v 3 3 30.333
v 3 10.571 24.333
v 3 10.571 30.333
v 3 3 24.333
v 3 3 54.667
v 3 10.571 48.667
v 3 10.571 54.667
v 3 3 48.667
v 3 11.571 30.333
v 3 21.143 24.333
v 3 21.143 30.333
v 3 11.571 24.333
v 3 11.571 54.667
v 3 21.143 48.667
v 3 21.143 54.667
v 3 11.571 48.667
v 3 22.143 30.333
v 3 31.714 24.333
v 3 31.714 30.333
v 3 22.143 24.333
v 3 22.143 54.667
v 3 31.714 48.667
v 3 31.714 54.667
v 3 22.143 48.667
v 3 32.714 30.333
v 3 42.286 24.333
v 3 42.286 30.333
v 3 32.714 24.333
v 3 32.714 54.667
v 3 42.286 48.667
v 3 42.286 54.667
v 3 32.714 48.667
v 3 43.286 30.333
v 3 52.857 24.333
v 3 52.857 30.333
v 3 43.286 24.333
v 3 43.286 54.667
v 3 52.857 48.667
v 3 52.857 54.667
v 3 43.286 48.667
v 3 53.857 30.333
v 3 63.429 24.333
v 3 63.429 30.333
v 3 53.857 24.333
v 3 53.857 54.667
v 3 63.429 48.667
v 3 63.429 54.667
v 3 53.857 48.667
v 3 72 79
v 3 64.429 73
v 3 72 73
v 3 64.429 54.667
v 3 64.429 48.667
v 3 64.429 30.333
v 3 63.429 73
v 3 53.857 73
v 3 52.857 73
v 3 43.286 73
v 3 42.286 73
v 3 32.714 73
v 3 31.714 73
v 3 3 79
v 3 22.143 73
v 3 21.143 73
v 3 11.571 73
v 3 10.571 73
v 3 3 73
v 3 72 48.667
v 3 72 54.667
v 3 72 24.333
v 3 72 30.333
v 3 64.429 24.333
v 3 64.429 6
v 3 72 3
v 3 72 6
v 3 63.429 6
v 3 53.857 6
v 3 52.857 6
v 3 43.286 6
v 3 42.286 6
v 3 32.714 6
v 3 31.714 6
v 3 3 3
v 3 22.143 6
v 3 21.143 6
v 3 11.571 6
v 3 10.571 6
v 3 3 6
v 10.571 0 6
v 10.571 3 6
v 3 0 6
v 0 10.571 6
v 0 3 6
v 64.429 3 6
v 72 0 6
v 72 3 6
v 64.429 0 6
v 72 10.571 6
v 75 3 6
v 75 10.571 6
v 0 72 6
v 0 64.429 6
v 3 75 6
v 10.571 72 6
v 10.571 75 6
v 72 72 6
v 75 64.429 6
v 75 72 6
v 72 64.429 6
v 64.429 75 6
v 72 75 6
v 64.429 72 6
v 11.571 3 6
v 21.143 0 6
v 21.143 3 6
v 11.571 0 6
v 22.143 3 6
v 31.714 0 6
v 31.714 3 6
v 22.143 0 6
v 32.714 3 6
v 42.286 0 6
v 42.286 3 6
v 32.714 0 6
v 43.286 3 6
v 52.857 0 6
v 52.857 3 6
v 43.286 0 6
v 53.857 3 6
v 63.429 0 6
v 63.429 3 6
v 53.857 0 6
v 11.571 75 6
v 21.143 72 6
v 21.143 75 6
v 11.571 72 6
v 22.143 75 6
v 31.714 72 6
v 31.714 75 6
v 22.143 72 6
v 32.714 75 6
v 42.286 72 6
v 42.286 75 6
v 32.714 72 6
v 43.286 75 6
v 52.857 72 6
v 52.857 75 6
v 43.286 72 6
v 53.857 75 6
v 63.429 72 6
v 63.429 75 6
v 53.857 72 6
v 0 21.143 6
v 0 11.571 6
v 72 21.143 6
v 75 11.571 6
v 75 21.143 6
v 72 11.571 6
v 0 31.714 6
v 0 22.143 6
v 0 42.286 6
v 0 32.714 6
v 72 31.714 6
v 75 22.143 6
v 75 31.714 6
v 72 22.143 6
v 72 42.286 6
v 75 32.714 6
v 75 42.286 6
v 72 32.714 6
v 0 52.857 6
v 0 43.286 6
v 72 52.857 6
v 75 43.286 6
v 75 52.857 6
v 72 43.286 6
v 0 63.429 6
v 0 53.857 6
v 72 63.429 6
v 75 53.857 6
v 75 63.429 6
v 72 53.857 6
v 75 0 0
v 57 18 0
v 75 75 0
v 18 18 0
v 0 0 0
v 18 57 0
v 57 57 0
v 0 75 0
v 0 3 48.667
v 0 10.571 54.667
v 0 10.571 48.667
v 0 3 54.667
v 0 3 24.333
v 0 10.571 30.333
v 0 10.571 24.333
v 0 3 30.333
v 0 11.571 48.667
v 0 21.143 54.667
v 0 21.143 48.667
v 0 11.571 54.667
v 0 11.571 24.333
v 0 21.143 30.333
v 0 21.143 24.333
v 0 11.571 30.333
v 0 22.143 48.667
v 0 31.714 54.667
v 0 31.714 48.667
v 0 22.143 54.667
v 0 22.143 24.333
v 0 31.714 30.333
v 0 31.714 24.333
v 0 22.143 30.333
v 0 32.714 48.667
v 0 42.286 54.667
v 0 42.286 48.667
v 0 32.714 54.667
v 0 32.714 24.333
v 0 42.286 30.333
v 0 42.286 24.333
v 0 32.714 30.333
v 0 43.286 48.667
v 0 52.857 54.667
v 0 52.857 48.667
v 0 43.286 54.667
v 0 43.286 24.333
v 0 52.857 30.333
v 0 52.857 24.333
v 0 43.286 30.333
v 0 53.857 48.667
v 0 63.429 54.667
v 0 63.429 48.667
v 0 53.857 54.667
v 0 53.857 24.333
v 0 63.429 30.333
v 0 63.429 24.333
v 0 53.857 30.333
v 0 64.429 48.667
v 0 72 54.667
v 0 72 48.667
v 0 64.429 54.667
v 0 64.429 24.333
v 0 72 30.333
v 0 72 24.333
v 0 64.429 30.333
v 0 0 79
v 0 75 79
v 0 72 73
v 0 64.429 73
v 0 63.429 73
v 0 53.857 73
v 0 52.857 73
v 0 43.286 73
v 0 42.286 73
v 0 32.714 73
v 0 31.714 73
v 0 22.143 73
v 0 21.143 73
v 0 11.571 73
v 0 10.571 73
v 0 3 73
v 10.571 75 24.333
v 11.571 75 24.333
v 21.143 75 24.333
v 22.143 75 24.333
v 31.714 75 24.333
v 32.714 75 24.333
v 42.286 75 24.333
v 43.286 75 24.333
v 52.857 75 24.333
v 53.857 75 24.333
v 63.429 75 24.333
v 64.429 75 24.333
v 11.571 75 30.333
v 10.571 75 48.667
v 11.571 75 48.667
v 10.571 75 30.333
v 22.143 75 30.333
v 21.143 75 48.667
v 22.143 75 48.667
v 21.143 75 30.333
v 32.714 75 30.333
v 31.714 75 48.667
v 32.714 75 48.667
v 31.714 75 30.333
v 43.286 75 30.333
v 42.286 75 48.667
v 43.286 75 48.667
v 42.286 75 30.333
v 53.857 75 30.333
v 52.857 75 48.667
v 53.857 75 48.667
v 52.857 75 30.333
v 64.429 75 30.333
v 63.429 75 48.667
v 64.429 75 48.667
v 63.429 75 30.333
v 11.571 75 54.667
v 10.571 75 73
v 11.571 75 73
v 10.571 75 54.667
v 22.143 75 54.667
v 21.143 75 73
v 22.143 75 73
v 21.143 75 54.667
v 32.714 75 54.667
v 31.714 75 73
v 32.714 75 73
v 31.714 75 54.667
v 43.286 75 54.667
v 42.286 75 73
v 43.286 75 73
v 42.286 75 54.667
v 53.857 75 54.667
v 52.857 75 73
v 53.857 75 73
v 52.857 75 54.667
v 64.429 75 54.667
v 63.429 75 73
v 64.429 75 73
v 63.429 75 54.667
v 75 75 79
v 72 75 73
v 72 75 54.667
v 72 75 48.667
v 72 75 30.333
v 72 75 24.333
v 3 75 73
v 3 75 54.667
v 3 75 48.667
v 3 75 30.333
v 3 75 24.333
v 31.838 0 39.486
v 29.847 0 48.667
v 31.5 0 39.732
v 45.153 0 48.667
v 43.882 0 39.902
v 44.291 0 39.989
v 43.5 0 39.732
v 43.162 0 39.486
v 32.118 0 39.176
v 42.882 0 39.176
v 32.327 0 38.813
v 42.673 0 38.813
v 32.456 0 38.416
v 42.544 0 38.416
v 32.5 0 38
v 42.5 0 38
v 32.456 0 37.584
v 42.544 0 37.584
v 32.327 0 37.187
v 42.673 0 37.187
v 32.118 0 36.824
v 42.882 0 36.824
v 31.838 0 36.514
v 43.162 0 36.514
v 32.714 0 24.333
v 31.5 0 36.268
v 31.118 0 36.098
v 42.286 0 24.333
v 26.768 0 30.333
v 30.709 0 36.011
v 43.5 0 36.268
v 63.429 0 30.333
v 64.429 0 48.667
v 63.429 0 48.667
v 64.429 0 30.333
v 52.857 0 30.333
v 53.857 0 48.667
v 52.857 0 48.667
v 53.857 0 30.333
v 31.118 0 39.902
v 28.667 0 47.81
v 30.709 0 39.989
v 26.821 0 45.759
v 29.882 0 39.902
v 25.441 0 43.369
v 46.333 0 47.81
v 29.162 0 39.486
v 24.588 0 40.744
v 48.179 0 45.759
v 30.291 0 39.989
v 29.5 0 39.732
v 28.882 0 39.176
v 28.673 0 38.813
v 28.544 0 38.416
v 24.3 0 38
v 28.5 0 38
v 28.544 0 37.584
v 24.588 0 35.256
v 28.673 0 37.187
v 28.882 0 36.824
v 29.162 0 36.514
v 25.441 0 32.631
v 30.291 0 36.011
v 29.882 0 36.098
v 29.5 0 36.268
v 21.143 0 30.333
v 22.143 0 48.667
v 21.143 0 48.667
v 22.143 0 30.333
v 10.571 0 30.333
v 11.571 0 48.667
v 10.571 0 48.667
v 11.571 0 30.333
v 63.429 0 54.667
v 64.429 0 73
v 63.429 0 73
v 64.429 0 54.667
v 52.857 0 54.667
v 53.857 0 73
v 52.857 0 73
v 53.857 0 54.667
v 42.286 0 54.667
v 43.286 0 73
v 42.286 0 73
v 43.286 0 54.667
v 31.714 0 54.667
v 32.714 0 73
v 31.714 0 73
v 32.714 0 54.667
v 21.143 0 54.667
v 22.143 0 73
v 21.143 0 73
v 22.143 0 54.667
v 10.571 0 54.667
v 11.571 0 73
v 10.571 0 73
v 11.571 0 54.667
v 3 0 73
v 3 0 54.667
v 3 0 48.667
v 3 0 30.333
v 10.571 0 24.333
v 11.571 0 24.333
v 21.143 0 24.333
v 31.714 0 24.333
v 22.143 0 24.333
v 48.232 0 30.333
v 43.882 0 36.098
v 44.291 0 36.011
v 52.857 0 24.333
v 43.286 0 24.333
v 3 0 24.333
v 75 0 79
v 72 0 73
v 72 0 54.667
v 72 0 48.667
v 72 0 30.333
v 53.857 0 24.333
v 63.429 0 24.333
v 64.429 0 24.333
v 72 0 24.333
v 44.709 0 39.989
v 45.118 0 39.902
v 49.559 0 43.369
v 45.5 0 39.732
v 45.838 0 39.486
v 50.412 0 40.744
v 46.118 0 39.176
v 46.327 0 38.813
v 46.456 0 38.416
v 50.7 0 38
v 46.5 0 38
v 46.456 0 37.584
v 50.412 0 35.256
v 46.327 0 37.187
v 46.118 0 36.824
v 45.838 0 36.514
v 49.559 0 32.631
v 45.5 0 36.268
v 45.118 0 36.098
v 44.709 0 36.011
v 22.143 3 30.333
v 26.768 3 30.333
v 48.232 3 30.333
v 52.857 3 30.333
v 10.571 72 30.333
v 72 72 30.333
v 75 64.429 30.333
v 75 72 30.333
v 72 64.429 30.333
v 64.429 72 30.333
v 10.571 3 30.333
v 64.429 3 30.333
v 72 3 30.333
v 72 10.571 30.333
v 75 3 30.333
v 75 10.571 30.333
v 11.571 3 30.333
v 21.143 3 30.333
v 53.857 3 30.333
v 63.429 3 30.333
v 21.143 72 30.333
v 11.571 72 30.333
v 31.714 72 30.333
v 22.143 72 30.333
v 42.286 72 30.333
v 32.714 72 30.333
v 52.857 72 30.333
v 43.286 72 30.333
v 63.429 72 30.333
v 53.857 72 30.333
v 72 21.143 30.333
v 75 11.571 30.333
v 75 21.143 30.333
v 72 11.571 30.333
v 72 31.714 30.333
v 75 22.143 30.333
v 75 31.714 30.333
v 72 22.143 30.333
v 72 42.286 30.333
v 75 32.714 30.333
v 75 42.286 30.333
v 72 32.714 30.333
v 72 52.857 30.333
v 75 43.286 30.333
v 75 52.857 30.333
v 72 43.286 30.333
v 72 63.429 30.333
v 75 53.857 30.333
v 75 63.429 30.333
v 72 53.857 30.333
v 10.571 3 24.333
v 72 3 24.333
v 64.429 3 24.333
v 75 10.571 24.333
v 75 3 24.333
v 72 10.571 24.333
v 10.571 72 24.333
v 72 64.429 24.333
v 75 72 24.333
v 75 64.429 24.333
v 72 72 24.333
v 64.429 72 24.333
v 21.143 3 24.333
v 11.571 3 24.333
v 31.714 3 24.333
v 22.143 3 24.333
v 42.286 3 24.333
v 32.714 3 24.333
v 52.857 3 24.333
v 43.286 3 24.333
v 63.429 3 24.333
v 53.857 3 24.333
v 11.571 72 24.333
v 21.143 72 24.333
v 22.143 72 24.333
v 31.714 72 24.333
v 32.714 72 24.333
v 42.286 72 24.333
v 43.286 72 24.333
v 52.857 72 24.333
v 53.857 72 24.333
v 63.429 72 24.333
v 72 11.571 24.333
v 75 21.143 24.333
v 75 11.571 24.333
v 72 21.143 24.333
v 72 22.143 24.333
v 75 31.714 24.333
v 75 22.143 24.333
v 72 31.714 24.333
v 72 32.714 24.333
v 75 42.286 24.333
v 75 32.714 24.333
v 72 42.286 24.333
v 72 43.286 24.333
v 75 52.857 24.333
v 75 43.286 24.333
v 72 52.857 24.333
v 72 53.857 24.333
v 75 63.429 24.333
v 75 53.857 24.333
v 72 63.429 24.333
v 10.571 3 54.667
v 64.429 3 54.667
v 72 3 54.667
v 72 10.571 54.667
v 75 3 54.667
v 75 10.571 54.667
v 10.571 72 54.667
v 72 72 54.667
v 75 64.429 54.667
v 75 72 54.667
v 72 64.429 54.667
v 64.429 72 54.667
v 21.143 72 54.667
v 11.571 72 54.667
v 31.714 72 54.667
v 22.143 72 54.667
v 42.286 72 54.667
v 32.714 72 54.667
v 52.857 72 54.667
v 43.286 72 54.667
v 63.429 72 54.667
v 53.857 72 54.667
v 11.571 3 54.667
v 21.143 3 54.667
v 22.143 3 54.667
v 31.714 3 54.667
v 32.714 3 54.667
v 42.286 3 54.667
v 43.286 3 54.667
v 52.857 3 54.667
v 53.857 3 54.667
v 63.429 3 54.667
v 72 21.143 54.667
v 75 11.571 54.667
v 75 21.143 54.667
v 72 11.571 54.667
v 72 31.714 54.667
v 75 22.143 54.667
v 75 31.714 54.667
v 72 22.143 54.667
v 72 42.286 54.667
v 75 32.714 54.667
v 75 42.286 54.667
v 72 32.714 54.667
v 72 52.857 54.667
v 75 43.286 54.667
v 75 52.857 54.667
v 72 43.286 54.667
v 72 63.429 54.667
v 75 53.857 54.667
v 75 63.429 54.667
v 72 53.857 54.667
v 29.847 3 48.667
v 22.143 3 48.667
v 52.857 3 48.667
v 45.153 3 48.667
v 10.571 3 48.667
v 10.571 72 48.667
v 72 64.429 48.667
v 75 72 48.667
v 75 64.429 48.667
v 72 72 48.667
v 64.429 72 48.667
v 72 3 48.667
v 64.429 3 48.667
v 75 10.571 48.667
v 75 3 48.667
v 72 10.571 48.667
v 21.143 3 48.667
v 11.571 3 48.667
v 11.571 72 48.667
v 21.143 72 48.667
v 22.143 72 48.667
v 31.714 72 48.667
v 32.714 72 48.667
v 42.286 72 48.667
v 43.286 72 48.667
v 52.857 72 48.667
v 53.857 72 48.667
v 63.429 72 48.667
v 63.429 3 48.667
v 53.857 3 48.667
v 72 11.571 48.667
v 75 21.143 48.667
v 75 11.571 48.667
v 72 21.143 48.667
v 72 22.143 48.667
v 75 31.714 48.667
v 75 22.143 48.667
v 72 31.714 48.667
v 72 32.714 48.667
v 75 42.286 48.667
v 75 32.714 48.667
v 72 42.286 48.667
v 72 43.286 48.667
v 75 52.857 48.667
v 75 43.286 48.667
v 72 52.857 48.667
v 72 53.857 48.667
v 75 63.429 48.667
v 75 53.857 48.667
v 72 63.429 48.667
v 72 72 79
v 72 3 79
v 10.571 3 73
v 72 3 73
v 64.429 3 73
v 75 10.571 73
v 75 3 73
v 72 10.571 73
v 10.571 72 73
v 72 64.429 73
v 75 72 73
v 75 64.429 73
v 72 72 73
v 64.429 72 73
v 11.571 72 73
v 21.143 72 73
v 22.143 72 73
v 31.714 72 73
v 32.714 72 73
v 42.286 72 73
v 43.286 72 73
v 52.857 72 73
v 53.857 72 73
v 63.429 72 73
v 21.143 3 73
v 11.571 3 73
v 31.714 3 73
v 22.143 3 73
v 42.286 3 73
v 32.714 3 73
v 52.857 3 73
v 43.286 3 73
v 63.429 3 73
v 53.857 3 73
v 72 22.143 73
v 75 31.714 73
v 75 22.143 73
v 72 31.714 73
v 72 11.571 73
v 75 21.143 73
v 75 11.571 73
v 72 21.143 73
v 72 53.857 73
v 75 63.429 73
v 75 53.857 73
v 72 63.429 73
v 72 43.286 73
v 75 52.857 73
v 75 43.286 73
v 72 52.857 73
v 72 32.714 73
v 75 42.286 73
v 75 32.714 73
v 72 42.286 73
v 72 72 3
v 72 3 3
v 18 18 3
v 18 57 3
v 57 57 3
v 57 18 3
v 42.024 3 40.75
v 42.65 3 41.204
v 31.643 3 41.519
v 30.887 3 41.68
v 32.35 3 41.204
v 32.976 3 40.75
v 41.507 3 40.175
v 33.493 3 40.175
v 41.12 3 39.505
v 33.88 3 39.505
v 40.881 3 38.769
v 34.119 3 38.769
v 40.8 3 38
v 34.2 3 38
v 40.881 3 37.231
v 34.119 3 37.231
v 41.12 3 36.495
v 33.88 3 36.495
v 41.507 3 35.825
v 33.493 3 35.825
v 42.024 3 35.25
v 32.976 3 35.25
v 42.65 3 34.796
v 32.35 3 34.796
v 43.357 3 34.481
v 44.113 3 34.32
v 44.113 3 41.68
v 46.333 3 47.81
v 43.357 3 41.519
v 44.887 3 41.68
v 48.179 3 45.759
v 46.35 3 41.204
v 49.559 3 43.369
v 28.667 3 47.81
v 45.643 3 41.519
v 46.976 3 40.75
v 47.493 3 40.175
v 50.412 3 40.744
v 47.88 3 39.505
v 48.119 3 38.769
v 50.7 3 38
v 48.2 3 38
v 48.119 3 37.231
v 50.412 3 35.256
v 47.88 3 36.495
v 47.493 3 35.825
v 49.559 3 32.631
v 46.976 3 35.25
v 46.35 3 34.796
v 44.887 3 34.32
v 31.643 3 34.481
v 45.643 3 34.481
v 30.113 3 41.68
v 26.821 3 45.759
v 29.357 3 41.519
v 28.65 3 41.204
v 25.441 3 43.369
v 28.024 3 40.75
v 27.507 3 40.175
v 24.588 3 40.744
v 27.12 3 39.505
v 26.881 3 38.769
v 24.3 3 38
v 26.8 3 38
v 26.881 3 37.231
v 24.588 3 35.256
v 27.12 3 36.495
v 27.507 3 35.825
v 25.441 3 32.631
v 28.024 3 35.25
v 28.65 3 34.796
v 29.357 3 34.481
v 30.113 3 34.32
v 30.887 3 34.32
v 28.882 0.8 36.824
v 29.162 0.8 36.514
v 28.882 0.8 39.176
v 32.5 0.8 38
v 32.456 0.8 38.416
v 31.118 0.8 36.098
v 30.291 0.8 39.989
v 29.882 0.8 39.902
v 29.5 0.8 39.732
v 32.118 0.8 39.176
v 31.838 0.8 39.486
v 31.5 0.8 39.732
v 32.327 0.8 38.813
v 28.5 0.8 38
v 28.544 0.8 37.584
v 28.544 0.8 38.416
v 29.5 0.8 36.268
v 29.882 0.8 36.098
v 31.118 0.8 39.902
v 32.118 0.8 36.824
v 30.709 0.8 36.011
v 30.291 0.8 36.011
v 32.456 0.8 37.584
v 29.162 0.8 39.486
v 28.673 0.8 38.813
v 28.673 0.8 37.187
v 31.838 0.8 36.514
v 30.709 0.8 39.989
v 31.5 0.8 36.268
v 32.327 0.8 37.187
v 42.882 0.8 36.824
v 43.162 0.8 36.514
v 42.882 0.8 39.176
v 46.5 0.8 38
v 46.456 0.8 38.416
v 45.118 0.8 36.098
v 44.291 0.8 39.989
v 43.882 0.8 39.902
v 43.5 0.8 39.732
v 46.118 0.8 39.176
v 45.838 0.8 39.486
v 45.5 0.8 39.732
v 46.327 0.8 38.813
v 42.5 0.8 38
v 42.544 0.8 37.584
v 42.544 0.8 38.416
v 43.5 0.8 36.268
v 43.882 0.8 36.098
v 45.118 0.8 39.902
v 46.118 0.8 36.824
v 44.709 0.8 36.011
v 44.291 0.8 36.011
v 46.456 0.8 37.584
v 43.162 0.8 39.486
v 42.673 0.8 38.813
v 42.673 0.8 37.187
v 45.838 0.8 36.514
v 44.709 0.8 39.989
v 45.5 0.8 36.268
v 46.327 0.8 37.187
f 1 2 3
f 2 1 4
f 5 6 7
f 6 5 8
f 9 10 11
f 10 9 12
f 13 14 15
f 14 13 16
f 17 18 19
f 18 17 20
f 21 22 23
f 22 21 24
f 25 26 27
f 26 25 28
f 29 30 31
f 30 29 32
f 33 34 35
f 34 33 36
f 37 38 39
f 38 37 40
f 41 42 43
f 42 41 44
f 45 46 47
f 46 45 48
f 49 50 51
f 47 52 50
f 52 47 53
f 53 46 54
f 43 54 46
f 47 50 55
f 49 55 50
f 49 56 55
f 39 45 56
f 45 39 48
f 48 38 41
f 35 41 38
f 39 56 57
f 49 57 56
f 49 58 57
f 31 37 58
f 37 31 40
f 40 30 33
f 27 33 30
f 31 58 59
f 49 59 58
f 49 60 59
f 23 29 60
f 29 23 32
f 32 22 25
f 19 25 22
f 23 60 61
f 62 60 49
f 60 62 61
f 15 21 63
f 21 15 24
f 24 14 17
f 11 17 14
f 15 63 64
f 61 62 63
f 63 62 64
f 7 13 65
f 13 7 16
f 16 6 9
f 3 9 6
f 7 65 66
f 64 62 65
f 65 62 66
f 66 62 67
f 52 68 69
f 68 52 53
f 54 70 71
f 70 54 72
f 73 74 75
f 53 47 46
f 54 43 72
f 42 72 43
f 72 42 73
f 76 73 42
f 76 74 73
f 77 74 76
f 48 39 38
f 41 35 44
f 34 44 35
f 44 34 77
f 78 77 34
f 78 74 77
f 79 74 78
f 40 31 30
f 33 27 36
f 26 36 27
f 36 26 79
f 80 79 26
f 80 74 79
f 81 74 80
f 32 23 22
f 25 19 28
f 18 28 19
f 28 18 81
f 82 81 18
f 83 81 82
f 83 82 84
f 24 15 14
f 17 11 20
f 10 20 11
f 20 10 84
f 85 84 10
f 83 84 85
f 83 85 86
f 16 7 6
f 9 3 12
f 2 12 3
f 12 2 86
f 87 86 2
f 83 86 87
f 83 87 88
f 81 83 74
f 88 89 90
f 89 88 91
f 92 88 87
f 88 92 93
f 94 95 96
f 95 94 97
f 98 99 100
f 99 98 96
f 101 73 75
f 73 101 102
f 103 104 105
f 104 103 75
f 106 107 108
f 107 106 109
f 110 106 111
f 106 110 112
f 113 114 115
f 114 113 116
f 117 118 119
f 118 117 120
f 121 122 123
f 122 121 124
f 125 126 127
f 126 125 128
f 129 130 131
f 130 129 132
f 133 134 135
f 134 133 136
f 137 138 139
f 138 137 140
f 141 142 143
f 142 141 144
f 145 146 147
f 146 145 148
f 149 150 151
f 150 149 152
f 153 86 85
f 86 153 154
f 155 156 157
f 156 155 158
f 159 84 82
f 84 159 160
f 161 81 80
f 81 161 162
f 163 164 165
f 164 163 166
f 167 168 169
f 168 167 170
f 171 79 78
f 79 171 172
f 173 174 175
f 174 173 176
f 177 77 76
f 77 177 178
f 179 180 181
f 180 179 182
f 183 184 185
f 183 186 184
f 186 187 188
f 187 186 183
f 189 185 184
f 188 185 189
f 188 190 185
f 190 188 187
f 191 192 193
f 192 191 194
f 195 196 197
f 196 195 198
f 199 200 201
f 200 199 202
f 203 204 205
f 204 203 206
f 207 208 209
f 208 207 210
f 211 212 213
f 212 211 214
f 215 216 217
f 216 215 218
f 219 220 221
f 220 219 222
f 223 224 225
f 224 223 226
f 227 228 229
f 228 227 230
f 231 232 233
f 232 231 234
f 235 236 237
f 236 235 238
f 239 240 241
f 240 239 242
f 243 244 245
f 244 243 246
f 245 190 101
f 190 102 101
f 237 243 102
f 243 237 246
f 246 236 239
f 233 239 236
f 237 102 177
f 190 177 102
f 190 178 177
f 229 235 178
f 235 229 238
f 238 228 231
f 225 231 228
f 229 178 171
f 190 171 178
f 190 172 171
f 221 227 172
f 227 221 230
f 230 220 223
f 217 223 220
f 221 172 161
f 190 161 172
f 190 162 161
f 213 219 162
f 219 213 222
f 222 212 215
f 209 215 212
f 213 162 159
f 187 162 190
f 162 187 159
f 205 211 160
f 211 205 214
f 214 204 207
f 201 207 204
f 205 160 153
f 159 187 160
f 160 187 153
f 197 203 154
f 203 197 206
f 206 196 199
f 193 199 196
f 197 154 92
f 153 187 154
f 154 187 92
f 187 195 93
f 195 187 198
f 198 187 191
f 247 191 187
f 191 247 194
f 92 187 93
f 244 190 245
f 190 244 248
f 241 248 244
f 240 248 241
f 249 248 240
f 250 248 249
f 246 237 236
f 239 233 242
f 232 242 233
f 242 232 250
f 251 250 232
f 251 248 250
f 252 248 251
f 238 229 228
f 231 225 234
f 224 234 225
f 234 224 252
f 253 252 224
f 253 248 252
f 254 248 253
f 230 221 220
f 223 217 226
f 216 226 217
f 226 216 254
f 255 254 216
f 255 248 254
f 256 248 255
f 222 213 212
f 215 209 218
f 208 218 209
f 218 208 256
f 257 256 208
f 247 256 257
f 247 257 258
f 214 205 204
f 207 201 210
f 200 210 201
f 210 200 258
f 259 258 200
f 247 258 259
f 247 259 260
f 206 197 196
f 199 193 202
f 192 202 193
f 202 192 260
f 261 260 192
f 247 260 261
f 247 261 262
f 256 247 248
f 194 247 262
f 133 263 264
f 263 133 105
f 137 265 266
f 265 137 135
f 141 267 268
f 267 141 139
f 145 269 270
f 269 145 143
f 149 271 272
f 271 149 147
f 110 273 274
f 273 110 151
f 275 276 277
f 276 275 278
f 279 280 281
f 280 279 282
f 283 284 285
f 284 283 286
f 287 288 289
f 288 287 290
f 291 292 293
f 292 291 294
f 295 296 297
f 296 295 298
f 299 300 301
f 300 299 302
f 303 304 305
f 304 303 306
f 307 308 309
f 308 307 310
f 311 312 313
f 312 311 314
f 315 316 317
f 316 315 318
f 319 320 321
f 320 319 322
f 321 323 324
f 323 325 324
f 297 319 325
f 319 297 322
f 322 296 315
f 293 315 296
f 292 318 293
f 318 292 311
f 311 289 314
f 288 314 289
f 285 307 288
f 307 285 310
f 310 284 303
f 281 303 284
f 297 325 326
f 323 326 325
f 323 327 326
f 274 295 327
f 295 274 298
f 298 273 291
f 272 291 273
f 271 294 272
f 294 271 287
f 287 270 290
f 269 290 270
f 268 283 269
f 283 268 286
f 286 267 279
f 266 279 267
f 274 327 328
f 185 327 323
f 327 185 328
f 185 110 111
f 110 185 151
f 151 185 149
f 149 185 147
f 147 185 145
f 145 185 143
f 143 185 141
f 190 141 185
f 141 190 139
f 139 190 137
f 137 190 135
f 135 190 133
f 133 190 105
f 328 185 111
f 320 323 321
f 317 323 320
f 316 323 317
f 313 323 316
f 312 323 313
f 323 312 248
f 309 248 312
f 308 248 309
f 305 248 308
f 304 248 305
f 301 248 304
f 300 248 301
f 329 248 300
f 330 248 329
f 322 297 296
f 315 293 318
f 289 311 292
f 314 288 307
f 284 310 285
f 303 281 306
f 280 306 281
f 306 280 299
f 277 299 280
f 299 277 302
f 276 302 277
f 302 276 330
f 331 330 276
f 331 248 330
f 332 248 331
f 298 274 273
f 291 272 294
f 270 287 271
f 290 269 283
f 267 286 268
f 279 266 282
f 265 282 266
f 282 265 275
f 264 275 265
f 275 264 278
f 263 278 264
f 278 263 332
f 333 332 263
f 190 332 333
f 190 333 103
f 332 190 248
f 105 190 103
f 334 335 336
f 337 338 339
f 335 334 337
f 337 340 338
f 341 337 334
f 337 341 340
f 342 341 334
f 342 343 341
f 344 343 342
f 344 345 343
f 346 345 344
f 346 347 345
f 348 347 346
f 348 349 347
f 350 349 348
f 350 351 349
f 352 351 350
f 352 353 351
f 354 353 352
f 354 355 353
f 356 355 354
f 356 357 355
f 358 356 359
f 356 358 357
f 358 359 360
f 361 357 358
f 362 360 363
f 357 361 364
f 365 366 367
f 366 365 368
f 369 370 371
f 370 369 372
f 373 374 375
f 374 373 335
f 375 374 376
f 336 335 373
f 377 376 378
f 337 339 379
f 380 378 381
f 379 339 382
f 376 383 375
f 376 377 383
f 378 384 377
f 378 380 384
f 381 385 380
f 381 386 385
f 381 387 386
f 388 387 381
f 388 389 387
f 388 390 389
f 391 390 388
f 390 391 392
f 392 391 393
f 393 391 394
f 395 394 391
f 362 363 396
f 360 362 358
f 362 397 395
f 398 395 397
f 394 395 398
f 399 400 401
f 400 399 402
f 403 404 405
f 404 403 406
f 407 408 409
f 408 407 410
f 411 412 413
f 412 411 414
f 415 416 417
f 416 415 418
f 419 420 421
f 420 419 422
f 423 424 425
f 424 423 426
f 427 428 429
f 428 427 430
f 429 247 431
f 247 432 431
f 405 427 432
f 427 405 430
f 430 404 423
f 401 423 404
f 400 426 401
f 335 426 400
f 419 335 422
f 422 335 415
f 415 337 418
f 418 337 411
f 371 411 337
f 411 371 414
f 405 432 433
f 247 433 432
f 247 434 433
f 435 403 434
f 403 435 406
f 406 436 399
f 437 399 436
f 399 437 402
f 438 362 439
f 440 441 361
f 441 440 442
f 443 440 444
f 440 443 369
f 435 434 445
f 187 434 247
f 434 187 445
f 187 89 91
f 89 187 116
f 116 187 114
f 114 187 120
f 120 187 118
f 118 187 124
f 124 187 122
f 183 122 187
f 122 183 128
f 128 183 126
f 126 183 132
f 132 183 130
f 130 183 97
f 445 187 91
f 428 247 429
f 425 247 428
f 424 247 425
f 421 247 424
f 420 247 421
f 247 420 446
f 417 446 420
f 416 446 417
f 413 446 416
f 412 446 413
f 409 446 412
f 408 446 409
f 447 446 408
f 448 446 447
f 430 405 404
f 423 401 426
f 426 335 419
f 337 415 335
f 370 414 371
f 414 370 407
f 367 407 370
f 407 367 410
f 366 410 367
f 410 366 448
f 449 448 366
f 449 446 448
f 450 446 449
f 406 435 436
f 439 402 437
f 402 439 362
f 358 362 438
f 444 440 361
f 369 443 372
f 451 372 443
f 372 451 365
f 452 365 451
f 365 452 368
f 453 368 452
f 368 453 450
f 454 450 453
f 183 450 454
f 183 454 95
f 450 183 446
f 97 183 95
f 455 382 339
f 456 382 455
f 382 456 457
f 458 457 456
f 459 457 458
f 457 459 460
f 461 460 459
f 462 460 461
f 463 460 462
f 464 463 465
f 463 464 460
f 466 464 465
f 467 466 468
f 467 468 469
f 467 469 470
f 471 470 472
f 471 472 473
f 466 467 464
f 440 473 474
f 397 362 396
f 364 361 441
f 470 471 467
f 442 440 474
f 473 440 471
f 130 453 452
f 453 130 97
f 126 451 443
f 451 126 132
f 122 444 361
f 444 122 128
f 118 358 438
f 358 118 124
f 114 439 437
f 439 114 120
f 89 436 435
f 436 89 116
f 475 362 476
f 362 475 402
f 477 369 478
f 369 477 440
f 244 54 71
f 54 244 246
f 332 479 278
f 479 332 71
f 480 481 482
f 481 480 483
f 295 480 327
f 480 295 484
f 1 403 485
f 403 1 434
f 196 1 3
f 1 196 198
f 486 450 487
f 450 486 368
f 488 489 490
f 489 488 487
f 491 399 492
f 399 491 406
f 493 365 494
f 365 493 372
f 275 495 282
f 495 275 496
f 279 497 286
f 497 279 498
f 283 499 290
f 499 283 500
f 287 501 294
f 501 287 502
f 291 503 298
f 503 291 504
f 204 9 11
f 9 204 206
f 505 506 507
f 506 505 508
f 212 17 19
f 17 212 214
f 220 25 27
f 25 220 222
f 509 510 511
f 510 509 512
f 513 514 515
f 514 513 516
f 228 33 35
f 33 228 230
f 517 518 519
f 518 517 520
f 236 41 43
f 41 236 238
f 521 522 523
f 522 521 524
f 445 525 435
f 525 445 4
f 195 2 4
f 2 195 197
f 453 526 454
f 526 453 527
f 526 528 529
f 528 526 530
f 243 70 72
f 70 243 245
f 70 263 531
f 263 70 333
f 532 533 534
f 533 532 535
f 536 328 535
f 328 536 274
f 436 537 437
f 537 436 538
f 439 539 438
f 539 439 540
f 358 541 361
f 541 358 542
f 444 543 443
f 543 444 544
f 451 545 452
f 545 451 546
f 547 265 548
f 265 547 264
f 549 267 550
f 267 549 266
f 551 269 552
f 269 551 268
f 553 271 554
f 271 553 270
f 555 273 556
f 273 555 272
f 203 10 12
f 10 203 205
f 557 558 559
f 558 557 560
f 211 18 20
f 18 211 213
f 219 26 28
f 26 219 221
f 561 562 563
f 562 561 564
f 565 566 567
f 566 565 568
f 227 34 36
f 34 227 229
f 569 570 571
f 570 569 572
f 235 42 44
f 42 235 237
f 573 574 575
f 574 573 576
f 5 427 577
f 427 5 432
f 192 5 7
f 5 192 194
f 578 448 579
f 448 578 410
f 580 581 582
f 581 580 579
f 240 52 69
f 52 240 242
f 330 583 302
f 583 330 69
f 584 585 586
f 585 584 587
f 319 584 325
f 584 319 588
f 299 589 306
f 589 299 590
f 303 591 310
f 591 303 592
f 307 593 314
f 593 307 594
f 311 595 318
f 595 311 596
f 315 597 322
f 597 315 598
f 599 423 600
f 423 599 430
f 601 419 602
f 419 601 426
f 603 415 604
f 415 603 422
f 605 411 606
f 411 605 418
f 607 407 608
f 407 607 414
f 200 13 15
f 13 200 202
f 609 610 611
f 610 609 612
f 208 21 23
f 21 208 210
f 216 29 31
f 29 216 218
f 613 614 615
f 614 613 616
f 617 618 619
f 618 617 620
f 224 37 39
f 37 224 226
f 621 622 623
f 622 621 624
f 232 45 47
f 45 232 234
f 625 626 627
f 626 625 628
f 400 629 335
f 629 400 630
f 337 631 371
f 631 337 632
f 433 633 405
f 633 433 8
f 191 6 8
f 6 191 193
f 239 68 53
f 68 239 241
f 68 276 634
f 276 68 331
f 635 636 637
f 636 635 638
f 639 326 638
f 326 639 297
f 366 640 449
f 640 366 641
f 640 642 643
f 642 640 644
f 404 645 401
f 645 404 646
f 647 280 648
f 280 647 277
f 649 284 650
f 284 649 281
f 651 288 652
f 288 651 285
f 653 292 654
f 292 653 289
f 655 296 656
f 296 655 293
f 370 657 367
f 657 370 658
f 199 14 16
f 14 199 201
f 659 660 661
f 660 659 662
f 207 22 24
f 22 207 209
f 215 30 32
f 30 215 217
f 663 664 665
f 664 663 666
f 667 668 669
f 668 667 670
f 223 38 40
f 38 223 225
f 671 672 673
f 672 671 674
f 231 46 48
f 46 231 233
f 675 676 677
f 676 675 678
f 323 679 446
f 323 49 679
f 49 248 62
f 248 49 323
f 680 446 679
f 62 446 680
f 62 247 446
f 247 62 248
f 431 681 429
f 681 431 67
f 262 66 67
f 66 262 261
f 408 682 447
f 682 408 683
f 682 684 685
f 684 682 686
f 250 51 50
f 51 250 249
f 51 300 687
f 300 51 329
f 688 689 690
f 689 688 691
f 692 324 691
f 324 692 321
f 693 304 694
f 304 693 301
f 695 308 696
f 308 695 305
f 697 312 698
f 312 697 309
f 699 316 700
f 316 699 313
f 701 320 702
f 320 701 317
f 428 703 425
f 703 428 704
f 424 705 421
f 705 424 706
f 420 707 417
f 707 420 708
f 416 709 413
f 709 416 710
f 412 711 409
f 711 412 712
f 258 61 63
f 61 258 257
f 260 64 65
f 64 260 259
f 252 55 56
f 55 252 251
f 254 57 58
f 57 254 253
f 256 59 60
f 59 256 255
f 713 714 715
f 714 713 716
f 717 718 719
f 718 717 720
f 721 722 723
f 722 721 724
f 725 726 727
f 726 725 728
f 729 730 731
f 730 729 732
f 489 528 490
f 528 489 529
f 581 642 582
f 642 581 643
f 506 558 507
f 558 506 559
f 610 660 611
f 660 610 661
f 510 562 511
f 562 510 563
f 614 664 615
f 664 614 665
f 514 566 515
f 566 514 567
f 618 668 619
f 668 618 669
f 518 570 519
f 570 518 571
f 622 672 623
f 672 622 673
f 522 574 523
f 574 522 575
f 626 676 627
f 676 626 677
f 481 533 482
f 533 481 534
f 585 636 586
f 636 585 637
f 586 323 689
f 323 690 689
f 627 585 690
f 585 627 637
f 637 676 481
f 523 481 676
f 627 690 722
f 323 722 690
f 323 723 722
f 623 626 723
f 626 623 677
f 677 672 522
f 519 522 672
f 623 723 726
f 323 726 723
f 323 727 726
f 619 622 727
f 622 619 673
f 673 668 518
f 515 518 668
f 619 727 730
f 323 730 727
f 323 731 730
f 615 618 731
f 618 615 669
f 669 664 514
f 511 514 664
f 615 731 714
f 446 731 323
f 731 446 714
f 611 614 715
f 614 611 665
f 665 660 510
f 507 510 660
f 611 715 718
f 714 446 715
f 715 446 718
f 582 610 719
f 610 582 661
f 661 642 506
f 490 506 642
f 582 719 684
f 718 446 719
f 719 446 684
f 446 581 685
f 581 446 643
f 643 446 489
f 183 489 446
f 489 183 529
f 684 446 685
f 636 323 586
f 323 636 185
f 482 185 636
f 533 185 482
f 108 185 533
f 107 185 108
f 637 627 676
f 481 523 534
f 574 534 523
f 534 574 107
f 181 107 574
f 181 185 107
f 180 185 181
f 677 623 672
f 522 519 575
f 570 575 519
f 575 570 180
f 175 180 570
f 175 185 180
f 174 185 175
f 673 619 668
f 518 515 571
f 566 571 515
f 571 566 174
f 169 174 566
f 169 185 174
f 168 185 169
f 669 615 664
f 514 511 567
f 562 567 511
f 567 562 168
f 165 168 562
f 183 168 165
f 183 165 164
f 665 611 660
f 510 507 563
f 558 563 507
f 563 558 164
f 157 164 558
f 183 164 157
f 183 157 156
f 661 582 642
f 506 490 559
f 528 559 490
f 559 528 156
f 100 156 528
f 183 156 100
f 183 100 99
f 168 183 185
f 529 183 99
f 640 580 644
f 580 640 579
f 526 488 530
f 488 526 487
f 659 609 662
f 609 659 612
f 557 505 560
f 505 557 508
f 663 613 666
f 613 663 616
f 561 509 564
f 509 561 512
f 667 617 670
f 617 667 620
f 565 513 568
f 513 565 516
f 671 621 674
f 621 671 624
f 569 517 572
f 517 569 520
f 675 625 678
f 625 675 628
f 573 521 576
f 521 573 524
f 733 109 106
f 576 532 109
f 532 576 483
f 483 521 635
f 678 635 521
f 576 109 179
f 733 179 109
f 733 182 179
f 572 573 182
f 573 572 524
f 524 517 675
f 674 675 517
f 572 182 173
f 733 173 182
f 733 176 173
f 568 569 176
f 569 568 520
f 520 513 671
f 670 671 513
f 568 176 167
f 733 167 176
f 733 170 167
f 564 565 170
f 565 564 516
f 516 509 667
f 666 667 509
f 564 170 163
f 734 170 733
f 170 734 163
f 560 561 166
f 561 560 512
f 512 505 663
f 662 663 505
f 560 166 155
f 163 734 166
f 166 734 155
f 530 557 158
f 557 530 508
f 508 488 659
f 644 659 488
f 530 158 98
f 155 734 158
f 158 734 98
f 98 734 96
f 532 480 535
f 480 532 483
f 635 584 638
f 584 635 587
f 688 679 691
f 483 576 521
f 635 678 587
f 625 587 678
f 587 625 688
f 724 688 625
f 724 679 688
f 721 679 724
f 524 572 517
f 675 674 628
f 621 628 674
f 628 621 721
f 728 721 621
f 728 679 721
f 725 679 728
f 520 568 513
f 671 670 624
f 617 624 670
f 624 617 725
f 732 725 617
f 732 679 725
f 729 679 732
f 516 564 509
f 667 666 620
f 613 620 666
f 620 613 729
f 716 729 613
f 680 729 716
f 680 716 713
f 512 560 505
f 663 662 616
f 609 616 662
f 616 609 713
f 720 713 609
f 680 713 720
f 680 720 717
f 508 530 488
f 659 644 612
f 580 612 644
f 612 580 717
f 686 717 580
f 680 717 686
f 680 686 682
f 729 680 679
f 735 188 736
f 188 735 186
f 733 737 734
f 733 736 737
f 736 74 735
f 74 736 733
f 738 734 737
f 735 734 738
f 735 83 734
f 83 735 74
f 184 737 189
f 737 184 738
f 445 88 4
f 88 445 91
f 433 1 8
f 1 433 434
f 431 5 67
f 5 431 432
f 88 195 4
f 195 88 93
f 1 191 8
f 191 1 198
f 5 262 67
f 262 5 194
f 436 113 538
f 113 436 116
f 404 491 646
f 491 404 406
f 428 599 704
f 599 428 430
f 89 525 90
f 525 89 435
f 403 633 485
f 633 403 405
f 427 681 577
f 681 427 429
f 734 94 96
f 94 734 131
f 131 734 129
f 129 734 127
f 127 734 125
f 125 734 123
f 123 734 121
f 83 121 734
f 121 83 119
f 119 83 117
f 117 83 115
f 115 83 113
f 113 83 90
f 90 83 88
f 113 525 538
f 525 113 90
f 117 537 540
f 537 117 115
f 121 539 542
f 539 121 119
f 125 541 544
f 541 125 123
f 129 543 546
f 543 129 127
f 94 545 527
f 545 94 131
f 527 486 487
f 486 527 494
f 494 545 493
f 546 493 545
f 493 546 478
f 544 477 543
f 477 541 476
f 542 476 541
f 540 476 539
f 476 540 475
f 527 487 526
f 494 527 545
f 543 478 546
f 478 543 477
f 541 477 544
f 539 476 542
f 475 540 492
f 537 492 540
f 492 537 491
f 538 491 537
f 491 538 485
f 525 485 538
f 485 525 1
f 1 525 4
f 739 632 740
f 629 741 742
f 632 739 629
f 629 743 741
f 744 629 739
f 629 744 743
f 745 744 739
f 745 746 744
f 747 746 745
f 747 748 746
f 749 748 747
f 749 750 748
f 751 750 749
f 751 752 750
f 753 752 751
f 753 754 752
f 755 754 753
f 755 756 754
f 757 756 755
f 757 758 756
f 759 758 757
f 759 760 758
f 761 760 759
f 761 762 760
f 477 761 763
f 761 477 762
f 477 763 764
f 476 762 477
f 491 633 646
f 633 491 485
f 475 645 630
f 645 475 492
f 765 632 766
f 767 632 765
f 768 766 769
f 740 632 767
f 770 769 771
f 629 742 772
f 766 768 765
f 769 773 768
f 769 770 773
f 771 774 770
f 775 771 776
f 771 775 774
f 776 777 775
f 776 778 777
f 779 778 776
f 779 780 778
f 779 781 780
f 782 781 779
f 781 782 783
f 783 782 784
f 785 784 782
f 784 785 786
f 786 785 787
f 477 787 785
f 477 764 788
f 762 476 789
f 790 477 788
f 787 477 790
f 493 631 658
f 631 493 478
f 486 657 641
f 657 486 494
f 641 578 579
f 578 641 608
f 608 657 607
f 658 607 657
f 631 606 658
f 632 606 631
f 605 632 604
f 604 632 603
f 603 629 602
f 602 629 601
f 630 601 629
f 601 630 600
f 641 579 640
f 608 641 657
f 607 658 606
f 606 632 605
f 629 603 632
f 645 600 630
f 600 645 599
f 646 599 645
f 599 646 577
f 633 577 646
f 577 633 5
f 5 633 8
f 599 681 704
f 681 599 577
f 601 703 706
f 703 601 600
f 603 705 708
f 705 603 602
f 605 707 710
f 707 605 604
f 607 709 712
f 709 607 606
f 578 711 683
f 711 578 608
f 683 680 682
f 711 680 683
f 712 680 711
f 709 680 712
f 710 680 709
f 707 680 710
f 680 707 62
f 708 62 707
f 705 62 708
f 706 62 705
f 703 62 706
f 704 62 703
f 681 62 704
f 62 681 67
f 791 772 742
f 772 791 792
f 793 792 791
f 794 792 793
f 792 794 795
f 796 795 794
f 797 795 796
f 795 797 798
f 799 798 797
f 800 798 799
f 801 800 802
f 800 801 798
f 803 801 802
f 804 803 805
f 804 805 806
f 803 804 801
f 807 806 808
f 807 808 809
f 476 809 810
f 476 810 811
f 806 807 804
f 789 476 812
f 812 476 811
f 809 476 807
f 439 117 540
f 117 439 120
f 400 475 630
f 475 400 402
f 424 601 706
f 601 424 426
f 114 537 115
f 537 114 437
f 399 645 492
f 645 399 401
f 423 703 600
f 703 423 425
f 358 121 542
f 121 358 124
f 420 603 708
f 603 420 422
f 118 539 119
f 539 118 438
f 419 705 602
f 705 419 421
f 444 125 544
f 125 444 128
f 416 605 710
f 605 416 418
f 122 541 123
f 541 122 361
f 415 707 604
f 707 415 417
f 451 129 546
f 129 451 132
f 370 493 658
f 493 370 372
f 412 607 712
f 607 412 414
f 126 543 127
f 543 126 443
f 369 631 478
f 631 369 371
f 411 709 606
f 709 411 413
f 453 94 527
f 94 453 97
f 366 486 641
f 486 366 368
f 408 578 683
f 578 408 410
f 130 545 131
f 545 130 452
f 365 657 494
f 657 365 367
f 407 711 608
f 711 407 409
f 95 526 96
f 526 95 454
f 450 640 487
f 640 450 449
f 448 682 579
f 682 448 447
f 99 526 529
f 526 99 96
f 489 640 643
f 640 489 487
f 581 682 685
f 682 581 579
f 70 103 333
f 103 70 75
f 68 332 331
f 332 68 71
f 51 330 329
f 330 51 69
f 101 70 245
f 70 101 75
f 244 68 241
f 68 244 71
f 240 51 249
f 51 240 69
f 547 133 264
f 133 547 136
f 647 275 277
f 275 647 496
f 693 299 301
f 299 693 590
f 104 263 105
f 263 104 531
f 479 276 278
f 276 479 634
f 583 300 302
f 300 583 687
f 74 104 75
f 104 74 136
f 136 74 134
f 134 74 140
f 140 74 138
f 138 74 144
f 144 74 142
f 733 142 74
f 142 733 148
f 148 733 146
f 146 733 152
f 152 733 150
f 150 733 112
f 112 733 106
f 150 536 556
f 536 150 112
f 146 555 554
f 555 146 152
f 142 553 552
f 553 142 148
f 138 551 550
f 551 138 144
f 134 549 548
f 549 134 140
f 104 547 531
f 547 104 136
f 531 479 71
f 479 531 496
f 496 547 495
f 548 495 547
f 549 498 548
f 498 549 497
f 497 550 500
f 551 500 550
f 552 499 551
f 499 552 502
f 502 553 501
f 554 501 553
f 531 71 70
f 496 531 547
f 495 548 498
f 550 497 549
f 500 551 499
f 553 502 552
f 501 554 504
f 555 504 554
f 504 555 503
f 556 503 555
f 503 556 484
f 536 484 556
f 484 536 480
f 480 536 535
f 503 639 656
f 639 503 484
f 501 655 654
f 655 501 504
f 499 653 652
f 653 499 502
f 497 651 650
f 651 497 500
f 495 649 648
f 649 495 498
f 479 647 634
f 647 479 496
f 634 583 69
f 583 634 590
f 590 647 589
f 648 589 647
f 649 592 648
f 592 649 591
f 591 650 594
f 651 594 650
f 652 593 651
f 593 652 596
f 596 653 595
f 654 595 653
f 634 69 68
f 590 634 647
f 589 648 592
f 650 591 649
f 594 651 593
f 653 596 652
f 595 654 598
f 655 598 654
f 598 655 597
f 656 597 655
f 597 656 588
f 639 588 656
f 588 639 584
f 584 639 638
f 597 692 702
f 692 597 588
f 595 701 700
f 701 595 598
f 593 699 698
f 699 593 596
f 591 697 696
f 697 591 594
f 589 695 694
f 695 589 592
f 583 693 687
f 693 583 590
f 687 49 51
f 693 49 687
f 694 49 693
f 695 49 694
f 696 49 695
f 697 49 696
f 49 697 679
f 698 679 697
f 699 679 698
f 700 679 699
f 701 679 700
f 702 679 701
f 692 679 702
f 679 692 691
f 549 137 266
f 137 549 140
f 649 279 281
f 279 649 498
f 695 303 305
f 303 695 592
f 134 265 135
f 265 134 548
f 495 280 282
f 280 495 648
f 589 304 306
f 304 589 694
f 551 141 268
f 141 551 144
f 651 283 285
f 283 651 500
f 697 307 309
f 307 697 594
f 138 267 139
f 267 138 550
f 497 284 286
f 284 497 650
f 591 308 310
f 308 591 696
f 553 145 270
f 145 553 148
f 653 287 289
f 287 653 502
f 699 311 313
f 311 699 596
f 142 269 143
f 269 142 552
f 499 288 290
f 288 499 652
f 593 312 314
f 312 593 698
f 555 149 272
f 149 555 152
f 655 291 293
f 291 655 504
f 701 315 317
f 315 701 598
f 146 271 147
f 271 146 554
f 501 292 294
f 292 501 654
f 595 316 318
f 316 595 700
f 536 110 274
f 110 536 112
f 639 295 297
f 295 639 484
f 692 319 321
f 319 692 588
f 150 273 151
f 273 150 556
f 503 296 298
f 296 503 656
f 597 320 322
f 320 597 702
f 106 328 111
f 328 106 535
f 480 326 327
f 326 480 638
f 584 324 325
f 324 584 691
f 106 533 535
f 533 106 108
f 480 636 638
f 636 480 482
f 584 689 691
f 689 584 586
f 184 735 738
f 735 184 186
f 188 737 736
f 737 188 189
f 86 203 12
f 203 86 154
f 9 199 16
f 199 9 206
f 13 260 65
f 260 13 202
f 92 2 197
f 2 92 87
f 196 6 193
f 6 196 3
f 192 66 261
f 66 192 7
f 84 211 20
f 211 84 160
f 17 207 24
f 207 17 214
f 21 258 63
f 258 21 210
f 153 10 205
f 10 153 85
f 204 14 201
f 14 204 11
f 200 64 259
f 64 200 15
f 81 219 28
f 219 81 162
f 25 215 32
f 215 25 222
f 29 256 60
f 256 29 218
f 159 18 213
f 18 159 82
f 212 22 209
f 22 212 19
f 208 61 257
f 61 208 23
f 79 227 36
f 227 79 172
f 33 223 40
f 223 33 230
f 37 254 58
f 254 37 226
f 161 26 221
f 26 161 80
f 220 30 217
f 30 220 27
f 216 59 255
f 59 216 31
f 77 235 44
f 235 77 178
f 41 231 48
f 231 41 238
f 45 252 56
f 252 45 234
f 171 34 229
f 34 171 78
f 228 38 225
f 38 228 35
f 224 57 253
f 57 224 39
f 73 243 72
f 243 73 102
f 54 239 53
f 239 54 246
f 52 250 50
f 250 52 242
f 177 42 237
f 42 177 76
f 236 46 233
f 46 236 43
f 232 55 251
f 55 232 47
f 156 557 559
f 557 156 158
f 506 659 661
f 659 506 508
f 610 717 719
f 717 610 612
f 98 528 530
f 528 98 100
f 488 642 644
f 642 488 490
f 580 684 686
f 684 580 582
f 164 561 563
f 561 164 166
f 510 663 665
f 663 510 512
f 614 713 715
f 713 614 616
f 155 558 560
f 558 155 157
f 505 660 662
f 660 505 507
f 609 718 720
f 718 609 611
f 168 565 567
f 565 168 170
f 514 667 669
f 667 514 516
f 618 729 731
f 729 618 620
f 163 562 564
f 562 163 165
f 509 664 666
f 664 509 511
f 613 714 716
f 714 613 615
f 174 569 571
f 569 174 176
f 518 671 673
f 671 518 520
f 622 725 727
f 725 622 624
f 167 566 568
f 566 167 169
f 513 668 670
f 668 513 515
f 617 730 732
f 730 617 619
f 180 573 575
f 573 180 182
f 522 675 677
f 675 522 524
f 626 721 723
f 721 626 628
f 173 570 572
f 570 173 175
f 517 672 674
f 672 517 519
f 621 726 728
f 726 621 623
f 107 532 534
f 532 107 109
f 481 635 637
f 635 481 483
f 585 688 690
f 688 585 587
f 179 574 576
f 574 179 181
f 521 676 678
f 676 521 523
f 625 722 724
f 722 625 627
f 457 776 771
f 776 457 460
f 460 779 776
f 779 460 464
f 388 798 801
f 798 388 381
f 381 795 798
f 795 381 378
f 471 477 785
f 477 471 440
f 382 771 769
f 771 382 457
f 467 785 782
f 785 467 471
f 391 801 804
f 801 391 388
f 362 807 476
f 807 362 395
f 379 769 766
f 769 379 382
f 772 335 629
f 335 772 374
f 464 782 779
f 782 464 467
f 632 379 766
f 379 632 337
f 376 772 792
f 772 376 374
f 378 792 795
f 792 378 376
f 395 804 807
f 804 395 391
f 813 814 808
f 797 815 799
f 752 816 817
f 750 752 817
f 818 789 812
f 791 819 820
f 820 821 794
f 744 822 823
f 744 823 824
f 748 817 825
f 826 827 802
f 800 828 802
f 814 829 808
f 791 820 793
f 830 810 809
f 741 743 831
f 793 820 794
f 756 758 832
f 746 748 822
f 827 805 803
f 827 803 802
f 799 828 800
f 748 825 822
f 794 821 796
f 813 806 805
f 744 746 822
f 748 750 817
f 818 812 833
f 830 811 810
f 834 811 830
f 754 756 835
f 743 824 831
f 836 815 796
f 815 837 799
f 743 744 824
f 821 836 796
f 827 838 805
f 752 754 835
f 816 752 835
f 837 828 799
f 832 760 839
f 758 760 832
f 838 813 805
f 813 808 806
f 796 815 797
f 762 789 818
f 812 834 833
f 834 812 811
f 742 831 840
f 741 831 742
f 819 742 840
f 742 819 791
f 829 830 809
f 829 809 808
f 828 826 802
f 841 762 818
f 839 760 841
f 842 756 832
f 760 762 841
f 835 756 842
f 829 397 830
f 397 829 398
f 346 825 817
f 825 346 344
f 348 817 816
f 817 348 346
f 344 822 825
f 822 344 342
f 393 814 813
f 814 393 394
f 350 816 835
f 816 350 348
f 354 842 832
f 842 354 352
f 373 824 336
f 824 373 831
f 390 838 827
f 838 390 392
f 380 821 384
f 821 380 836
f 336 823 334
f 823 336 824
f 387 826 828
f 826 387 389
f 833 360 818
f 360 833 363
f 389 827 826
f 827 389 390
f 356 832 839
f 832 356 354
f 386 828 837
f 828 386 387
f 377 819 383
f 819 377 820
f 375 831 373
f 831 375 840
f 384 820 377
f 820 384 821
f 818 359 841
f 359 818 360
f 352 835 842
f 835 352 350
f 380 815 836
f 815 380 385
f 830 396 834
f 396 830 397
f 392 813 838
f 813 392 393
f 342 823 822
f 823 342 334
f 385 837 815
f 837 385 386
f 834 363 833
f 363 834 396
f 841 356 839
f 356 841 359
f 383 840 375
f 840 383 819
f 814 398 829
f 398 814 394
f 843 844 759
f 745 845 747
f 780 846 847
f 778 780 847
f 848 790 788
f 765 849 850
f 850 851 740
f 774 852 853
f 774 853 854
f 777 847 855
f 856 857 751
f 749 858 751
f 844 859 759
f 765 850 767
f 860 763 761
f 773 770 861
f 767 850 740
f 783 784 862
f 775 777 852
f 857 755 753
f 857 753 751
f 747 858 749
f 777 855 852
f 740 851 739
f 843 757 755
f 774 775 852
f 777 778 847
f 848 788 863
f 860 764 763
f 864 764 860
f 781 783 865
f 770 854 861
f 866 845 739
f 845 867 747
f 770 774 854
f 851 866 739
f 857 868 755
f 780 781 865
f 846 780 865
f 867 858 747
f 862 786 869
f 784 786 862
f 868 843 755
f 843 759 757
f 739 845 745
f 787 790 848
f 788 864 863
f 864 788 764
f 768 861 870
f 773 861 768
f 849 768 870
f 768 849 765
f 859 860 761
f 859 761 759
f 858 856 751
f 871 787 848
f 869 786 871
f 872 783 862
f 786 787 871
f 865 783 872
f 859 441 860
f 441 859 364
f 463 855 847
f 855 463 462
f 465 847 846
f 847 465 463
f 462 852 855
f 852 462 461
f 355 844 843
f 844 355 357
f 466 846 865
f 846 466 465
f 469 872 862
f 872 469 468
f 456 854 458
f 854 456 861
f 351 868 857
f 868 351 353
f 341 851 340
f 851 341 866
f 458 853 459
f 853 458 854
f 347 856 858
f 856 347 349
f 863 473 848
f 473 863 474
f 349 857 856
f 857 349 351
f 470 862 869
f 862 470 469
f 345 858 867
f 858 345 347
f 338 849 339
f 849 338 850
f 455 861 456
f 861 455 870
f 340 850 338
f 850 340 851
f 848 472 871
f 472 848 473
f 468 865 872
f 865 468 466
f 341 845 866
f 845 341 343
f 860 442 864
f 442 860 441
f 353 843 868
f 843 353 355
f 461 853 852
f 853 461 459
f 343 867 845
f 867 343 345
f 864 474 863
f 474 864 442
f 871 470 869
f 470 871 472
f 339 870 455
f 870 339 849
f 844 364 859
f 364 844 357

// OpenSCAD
$fn = 30;

wall = 3;

internal_sz = 69;
internal_sz_z = 79;

bottom_bar_length = internal_sz + 2 * wall;
bottom_bar_width = 18;
bottom_bar_height = wall;

bar_sz_z = 6;
bar_step_z_n = 3;
bar_step_z = (internal_sz_z-bar_sz_z) / bar_step_z_n;

bar_step_count = 7;

attachment_dist_z = 38;
attachment_d = 26.4;

hole_d_through = 4;
bolt_cap_d = 7.4;
bolt_cap_sz = 2.2;


hole_dist = 14;

echo("size=", (bottom_bar_length-1)/bar_step_count);

module square_bottle_holder() {
	difference() {
		union() {
			for(xp=[0, 1]) {
				translate([xp*(wall+internal_sz+wall-bottom_bar_width), 0, 0]) {
					cube([bottom_bar_width, bottom_bar_length, bottom_bar_height]);
				}
				for(zp=[0:1:bar_step_z_n]) {
					translate([xp*(wall+internal_sz), 0, zp*bar_step_z]) {
						cube([wall, bottom_bar_length, bar_sz_z]);
					}
				}
			}
			for(yp=[0, 1]) {
				for(xpp=[0:1:bar_step_count]) {
					translate([xpp*((bottom_bar_length-1)/bar_step_count)-(xpp==bar_step_count ? wall-1 : 0), yp*(wall+internal_sz), 0]) {
						cube([xpp==0 || xpp==bar_step_count ? wall : 1, wall, internal_sz_z]);
					}
				}
			}
			
			for(yp=[0, 1]) {
				translate([0, yp*(wall+internal_sz+wall-bottom_bar_width), 0]) {
					cube([bottom_bar_length, bottom_bar_width, bottom_bar_height]);
				}
				for(zp=[0:1:bar_step_z_n]) {
					translate([0, yp*(wall+internal_sz), zp*bar_step_z]) {
						cube([bottom_bar_length, wall, bar_sz_z]);
					}
				}
			}
			
			for(xp=[0, 1]) {
				for(ypp=[0:1:bar_step_count]) {
					translate([xp*(wall+internal_sz), ypp*((bottom_bar_length-1)/bar_step_count), 0]) {
						cube([wall, 1, internal_sz_z]);
					}
				}
			}
			// attachment
			translate([bottom_bar_length/2, wall, attachment_dist_z]) {
				rotate([90, 0, 0]) {
					cylinder(d=attachment_d, h=wall);
				}
			}
		}
		// attachment holes
		translate([bottom_bar_length/2, wall, attachment_dist_z]) {
			for(p=[-1,1]) {
				translate([p*hole_dist/2, 0, 0]) {
					rotate([90, 0, 0]) {
						cylinder(d2=hole_d_through, d1=bolt_cap_d, h=bolt_cap_sz);
						cylinder(d=hole_d_through, h=4*wall);
					}
				}
			}
		}	
	}	
}

difference() {
	square_bottle_holder();
	translate([-20, -20, -1]) {
//		cube([100, 100, 30]);
		translate([0, 0, 32]) {
//			cube([100, 100, 100]);
		}
	}
}
